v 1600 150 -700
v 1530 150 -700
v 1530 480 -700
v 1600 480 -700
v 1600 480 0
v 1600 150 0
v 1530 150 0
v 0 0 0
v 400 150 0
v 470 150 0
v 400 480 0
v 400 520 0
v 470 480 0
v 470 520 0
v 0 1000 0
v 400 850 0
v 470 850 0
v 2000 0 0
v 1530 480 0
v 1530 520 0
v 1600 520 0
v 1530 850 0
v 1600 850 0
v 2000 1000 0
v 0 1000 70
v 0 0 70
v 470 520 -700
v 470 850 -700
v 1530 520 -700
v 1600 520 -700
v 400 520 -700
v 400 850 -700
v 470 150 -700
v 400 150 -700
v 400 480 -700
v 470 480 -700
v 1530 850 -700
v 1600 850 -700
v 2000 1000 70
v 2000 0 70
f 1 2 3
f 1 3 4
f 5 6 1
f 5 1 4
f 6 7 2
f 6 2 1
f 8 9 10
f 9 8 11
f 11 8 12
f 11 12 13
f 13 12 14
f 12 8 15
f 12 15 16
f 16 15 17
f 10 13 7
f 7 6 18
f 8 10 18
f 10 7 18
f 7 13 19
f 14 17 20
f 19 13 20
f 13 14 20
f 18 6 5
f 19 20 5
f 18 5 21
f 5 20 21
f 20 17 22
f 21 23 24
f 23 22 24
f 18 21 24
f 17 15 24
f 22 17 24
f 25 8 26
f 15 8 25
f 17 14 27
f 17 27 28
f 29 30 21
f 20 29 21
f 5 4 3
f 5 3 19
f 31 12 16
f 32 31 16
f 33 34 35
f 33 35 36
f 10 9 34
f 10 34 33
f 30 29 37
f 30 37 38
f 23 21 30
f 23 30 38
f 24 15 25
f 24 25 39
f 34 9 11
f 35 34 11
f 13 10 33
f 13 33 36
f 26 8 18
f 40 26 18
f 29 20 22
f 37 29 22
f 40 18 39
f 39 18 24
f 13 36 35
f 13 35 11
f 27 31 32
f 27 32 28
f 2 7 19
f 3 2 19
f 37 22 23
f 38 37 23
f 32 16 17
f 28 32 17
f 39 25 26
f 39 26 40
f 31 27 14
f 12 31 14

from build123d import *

# Parameters (mm, degrees)
F0_W     = 2000
F0_H     = 1000
F1_DEPTH = 70
F2_W     = 70
F2_H     = 700
F3_DEPTH = 700
F4_W     = 40
F4_H     = 700
F5_DEPTH = 1600.001


with BuildPart() as f1:
    # F0 (on Top) → F1 (new body)
    with BuildSketch(Plane.XY):
        with Locations((1000, 500)):
            Rectangle(F0_W, F0_H)
    extrude(amount=F1_DEPTH)

    # F2 (on Top) → F3 (join)
    with BuildSketch(Plane.XY):
        with Locations((435, 500)):
            Rectangle(F2_W, F2_H)
        with Locations((1565, 500)):
            Rectangle(F2_W, F2_H)
    extrude(amount=-F3_DEPTH)

    # F4 (on face) → F5 (cut, through all)
    with BuildSketch(Plane.YZ.offset(1600)):
        with Locations((500, -350)):
            Rectangle(F4_W, F4_H)
    extrude(amount=-F5_DEPTH, mode=Mode.SUBTRACT)


solid = f1.part
